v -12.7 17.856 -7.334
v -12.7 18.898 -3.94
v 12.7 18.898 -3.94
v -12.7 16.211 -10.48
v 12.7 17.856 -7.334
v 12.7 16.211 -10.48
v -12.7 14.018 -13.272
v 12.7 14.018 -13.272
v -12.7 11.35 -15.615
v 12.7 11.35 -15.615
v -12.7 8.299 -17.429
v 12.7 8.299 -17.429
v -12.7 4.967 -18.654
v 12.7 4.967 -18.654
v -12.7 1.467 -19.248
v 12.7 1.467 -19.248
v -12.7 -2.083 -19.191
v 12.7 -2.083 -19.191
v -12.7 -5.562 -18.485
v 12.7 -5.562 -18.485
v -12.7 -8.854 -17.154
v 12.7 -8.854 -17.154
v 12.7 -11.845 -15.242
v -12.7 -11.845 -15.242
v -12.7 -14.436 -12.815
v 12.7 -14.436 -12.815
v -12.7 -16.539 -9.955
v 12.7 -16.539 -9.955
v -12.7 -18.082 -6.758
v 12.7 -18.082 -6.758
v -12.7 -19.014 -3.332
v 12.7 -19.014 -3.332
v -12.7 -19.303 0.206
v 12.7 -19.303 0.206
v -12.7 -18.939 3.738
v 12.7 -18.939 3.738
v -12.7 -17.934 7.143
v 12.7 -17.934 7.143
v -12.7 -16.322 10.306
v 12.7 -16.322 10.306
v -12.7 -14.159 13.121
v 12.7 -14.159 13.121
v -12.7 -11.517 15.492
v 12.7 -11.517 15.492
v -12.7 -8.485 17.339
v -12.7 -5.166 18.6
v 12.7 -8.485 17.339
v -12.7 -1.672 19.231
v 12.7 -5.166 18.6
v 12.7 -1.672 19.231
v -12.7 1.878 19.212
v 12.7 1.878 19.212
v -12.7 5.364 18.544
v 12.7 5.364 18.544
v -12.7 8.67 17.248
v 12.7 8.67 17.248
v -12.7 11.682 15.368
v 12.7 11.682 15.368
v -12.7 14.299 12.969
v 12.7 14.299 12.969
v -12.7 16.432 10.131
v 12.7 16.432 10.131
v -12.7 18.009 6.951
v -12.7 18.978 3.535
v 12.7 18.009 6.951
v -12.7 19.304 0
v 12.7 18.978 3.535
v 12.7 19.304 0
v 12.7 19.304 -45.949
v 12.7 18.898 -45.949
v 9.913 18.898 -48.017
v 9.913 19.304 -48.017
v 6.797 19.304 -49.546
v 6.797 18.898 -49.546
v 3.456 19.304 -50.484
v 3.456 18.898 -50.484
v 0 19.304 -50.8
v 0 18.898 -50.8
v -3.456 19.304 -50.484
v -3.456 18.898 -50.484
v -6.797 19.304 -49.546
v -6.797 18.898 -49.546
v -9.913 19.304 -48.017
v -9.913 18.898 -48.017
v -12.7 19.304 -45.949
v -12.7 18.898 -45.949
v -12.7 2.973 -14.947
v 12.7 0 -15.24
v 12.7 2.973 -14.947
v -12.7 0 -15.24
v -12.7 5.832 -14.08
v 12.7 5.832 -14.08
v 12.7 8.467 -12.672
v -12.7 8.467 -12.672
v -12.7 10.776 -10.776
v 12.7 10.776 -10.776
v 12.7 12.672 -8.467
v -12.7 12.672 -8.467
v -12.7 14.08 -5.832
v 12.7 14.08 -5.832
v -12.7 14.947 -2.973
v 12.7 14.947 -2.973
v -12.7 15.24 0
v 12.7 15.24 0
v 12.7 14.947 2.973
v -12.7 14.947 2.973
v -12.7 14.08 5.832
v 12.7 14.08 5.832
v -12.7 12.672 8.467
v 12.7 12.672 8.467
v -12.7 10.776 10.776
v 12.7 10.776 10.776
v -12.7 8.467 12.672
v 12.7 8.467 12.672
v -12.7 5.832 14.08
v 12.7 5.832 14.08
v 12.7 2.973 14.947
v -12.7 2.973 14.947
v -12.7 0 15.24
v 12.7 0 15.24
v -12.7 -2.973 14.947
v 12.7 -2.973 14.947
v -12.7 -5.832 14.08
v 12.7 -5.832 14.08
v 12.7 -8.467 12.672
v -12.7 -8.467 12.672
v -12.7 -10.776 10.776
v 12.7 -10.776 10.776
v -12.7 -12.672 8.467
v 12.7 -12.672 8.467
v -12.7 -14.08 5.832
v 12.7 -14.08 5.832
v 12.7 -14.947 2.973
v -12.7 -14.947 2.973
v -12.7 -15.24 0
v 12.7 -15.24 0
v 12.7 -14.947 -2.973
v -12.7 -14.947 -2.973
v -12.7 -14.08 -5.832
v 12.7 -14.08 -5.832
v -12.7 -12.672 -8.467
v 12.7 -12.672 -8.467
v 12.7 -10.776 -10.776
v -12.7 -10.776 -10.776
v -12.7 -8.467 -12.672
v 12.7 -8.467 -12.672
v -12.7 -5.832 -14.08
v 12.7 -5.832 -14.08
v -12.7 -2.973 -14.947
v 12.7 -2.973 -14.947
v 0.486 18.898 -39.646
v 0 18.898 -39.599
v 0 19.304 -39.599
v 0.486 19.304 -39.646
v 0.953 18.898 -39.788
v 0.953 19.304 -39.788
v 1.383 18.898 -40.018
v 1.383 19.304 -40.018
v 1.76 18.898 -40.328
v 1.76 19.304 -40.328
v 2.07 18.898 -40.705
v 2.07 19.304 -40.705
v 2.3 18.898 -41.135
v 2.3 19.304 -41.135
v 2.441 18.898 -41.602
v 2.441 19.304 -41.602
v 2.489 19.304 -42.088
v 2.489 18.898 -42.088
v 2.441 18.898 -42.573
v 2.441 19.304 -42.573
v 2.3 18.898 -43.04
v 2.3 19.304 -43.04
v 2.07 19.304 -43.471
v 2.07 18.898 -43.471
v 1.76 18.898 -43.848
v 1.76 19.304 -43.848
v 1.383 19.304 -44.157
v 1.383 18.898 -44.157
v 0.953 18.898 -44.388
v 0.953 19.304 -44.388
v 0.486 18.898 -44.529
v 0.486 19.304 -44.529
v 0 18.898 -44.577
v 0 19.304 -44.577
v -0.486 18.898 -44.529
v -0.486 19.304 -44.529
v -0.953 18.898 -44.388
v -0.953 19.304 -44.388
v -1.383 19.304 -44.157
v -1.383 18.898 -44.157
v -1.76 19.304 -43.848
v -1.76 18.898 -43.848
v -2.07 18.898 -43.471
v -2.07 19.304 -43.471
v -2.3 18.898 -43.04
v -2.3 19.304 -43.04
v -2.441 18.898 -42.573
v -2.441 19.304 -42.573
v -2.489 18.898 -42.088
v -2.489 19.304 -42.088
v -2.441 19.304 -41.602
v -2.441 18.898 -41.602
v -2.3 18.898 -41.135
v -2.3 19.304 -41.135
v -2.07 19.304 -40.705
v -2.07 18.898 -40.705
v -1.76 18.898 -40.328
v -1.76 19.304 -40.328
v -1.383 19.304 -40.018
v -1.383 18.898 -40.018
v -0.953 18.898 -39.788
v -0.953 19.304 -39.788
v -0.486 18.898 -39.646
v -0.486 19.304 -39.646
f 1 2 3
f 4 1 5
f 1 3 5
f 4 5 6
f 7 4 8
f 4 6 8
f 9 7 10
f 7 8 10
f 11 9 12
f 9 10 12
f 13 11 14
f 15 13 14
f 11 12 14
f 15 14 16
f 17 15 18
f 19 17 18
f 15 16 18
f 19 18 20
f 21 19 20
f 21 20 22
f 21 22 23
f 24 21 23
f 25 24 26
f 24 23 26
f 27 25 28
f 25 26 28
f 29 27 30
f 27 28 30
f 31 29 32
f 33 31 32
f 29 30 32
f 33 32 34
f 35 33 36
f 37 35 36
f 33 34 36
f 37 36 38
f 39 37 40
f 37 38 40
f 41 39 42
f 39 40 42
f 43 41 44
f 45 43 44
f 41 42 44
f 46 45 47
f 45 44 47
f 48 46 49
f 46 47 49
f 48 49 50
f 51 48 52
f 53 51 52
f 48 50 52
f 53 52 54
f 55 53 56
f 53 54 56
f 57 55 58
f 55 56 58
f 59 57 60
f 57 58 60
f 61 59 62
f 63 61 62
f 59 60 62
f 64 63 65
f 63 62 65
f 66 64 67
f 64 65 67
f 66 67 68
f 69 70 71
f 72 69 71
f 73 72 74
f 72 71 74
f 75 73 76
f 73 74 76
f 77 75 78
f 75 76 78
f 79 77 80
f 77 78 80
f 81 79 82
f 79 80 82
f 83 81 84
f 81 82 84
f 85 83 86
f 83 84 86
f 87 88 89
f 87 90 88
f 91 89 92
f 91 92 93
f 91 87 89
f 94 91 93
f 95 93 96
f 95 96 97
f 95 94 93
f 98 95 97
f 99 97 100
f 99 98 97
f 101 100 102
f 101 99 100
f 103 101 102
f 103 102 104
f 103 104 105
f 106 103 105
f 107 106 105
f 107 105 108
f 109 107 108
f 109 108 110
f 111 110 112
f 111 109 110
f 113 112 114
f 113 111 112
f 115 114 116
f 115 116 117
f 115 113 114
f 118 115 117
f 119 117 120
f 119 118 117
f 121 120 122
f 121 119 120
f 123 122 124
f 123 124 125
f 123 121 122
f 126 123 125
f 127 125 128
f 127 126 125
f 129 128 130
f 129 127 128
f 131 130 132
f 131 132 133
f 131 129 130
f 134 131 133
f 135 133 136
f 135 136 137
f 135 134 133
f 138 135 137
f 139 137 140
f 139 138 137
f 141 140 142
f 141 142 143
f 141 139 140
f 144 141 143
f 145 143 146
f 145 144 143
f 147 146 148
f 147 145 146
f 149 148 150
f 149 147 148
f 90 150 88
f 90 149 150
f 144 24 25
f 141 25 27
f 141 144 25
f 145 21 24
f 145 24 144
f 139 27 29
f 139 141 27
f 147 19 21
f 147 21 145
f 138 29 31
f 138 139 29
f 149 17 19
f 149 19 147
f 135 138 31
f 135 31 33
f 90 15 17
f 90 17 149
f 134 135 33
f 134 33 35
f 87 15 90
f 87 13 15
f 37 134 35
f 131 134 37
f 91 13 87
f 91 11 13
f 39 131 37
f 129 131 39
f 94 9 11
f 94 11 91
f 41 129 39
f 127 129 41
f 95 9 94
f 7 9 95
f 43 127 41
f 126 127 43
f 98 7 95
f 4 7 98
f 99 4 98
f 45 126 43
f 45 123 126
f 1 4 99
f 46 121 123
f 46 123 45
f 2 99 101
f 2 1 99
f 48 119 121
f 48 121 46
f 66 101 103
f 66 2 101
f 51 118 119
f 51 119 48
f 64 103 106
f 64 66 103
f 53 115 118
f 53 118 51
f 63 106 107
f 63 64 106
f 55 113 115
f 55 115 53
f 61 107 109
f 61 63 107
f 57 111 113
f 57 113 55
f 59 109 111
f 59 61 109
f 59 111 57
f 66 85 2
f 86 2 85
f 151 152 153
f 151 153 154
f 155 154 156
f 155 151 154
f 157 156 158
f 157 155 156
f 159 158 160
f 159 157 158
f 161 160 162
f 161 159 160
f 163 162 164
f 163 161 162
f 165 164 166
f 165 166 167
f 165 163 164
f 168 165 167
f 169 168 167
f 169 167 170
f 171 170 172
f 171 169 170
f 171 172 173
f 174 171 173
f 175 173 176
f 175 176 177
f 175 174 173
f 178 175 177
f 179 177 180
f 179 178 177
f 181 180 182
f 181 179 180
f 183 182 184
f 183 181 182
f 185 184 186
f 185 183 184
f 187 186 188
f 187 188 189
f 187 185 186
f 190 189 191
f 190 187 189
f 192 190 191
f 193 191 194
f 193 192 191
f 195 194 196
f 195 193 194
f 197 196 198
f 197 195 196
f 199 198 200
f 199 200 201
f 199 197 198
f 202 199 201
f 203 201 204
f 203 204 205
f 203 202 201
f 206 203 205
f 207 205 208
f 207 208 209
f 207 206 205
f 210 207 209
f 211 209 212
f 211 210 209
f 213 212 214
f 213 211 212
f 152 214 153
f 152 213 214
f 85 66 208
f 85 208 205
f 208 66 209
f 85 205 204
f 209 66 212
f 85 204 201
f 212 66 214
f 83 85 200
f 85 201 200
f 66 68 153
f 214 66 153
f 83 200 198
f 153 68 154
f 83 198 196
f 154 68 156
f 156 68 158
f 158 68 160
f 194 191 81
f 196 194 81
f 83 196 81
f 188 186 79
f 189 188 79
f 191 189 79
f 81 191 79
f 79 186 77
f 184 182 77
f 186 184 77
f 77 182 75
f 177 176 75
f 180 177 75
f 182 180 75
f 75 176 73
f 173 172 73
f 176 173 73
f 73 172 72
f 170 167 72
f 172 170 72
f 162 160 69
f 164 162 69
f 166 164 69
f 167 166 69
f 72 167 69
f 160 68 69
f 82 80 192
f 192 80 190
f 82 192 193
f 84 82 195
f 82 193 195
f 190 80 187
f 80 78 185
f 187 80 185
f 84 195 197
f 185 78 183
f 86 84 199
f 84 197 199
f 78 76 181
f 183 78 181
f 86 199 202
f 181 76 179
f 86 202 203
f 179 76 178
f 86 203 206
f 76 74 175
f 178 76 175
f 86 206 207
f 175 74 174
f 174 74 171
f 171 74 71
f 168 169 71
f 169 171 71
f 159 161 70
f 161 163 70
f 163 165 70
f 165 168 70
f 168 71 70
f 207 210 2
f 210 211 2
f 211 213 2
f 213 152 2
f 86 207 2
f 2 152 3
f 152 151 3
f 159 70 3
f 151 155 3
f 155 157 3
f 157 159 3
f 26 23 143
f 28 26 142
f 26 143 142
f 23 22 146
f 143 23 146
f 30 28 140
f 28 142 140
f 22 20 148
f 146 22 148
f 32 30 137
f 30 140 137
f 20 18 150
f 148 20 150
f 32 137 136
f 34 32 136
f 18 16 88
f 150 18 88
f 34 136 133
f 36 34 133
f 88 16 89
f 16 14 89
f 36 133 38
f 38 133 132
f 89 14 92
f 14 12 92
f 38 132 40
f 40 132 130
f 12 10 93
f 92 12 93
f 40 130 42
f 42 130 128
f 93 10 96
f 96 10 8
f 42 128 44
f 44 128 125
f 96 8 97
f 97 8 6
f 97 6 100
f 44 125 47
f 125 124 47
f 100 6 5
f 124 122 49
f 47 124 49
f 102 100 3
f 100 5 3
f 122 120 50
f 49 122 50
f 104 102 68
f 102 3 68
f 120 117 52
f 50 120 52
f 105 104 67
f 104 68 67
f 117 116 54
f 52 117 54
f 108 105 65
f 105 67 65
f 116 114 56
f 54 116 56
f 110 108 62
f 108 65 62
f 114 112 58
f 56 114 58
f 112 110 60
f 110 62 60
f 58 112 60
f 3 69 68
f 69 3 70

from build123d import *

# Parameters (mm, degrees)
SKETCH1_R           = 15.24
BOSS_EXTRUDE1_DEPTH = 12.7
ONEHOLE_START       = -0.4064
SKETCH2_R           = 2.4892
ONEHOLE_DEPTH       = 0.4064


with BuildPart() as part:
    # Sketch1 → Boss-Extrude1 (new, symmetric)
    with BuildSketch(Plane(origin=(0, 0, 0), x_dir=(0, 0, -1), z_dir=(1, 0, 0))):
        with BuildLine():
            Line((0, 19.304), (50.8, 19.304))
            Line((50.8, 19.304), (50.8, 18.8976))
            Line((50.8, 18.8976), (3.940194188, 18.8976))
            ThreePointArc((3.940194188, 18.8976), (-1.980548611, -19.202131215), (0, 19.304))
        make_face()
        Circle(SKETCH1_R, mode=Mode.SUBTRACT)
    extrude(amount=BOSS_EXTRUDE1_DEPTH, both=True)

    # Sketch2 → OneHole (cut)
    with BuildSketch(Plane(origin=(0, 19.304, 0), x_dir=(1, 0, 0), z_dir=(0, 1, 0)).offset(ONEHOLE_START)):
        with Locations(Location((0, 42.0878, 0), (0, 0, 270))):
            Circle(SKETCH2_R)
        with BuildLine():
            Line((-12.7, 45.949031657), (-12.7, 51.435))
            Line((-12.7, 51.435), (12.7, 51.435))
            Line((12.7, 51.435), (12.7, 45.949031657))
            ThreePointArc((12.7, 45.949031657), (0, 50.8), (-12.7, 45.949031657))
        make_face()
    extrude(amount=ONEHOLE_DEPTH, mode=Mode.SUBTRACT)


solid = part.part
